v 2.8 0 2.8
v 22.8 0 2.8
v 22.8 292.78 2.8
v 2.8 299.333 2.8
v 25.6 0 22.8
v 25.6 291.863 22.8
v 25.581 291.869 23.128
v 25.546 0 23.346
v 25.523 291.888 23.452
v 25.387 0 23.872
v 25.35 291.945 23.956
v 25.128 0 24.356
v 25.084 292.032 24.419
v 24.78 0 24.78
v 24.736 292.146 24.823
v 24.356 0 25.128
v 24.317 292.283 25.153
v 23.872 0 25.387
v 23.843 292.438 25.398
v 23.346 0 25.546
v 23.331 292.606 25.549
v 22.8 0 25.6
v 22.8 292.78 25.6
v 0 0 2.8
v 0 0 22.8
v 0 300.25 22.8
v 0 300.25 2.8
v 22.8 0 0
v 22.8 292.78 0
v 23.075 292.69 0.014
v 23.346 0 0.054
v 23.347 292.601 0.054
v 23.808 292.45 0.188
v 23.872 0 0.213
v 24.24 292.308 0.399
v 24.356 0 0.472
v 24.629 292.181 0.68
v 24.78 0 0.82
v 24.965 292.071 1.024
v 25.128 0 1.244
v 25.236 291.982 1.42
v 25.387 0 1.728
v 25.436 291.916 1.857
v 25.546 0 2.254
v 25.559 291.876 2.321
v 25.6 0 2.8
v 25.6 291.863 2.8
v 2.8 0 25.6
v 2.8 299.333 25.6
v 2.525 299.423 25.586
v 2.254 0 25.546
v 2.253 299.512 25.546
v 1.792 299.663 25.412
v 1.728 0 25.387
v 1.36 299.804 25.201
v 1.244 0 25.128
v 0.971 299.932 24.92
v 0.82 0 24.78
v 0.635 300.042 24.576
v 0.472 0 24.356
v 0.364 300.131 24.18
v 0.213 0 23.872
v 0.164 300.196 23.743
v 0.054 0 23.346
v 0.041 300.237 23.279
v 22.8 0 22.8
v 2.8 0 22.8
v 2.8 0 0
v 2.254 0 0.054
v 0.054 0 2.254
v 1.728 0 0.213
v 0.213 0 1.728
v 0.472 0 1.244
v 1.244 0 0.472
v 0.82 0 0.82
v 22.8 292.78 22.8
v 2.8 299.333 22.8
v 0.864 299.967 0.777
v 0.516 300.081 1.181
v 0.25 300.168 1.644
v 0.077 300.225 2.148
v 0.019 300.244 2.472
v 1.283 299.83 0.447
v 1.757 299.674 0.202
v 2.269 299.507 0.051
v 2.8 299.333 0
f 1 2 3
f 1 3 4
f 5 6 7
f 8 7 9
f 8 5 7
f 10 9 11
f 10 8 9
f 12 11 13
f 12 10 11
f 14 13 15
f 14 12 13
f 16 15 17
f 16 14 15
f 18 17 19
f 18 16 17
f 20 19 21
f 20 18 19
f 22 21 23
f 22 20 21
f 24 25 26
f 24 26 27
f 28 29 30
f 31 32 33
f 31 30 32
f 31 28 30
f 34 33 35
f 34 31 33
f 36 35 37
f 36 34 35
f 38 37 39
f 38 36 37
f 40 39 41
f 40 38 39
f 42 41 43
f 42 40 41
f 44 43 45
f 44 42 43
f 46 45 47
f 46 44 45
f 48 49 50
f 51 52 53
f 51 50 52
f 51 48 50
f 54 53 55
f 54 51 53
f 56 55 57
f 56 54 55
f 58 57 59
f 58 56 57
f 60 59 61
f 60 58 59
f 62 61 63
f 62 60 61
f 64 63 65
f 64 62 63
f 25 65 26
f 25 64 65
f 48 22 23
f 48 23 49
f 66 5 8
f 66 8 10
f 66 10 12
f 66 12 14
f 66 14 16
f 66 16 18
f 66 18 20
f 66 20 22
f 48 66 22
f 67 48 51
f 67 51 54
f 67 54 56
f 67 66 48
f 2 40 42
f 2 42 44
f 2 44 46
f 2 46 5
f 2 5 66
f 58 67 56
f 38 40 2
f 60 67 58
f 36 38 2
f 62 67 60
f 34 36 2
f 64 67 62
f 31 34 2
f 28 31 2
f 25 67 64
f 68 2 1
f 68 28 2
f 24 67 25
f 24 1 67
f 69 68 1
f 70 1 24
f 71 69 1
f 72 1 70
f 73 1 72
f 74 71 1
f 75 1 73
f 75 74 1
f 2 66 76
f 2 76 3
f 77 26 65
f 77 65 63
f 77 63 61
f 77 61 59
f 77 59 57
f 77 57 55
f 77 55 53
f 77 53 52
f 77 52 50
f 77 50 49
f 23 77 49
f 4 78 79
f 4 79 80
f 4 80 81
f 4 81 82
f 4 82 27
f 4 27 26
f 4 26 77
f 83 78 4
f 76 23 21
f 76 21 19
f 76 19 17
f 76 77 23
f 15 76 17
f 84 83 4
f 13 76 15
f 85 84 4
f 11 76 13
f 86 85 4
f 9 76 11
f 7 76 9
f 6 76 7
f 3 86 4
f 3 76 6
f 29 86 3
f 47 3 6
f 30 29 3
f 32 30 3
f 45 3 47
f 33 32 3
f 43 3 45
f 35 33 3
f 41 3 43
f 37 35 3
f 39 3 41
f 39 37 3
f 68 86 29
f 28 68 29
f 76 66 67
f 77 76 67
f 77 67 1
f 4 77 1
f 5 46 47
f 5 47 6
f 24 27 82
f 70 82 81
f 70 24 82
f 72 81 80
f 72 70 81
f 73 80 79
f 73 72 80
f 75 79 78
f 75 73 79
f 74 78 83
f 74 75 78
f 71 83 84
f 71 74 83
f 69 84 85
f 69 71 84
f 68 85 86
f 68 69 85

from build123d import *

# Parameters (mm, degrees)
BOSS_EXTRUDE1_DEPTH     = 300.25
SKETCH3_W               = 20
SKETCH3_H               = 20
CUT_EXTRUDE1_DEPTH      = 1040.5
CUT_EXTRUDE2_DEPTH      = 303.20069904
CUT_EXTRUDE2_DEPTH_BACK = 303.20069904


with BuildPart() as part:
    # Sketch1 → Boss-Extrude1 (new body)
    with BuildSketch(Plane(origin=(0, 0, 0), x_dir=(1, 0, 0), z_dir=(0, 1, 0))):
        with BuildLine():
            Line((2.8, 0), (22.8, 0))
            ThreePointArc((22.8, 0), (24.779898987, -0.820101013), (25.6, -2.8))
            Line((25.6, -2.8), (25.6, -22.8))
            ThreePointArc((25.6, -22.8), (24.779898987, -24.779898987), (22.8, -25.6))
            Line((22.8, -25.6), (2.8, -25.6))
            ThreePointArc((2.8, -25.6), (0.820101013, -24.779898987), (0, -22.8))
            Line((0, -22.8), (0, -2.8))
            ThreePointArc((0, -2.8), (0.820101013, -0.820101013), (2.8, 0))
        make_face()
    extrude(amount=BOSS_EXTRUDE1_DEPTH)

    # Sketch3 → Cut-Extrude1 (cut)
    with BuildSketch(Plane(origin=(0, 0, 0), x_dir=(-1, 0, 0), z_dir=(0, -1, 0))):
        with Locations((-12.8, -12.8)):
            Rectangle(SKETCH3_W, SKETCH3_H)
    extrude(amount=-CUT_EXTRUDE1_DEPTH, mode=Mode.SUBTRACT)

    # Sketch4 → Cut-Extrude2 (cut, two sides: drawn at the far end of the back side and taken through both)
    with BuildSketch(Plane.XY.offset(22.8).offset(-CUT_EXTRUDE2_DEPTH_BACK)):
        Polygon((-582.227773903, 491.001368364), (0, 300.25), (25.6, 291.862844236), (607.827773903, 101.111475872), (989.330510631, 1265.567023678), (-200.725037175, 1655.456916171), align=None)
    extrude(amount=CUT_EXTRUDE2_DEPTH + CUT_EXTRUDE2_DEPTH_BACK, mode=Mode.SUBTRACT)


solid = part.part
